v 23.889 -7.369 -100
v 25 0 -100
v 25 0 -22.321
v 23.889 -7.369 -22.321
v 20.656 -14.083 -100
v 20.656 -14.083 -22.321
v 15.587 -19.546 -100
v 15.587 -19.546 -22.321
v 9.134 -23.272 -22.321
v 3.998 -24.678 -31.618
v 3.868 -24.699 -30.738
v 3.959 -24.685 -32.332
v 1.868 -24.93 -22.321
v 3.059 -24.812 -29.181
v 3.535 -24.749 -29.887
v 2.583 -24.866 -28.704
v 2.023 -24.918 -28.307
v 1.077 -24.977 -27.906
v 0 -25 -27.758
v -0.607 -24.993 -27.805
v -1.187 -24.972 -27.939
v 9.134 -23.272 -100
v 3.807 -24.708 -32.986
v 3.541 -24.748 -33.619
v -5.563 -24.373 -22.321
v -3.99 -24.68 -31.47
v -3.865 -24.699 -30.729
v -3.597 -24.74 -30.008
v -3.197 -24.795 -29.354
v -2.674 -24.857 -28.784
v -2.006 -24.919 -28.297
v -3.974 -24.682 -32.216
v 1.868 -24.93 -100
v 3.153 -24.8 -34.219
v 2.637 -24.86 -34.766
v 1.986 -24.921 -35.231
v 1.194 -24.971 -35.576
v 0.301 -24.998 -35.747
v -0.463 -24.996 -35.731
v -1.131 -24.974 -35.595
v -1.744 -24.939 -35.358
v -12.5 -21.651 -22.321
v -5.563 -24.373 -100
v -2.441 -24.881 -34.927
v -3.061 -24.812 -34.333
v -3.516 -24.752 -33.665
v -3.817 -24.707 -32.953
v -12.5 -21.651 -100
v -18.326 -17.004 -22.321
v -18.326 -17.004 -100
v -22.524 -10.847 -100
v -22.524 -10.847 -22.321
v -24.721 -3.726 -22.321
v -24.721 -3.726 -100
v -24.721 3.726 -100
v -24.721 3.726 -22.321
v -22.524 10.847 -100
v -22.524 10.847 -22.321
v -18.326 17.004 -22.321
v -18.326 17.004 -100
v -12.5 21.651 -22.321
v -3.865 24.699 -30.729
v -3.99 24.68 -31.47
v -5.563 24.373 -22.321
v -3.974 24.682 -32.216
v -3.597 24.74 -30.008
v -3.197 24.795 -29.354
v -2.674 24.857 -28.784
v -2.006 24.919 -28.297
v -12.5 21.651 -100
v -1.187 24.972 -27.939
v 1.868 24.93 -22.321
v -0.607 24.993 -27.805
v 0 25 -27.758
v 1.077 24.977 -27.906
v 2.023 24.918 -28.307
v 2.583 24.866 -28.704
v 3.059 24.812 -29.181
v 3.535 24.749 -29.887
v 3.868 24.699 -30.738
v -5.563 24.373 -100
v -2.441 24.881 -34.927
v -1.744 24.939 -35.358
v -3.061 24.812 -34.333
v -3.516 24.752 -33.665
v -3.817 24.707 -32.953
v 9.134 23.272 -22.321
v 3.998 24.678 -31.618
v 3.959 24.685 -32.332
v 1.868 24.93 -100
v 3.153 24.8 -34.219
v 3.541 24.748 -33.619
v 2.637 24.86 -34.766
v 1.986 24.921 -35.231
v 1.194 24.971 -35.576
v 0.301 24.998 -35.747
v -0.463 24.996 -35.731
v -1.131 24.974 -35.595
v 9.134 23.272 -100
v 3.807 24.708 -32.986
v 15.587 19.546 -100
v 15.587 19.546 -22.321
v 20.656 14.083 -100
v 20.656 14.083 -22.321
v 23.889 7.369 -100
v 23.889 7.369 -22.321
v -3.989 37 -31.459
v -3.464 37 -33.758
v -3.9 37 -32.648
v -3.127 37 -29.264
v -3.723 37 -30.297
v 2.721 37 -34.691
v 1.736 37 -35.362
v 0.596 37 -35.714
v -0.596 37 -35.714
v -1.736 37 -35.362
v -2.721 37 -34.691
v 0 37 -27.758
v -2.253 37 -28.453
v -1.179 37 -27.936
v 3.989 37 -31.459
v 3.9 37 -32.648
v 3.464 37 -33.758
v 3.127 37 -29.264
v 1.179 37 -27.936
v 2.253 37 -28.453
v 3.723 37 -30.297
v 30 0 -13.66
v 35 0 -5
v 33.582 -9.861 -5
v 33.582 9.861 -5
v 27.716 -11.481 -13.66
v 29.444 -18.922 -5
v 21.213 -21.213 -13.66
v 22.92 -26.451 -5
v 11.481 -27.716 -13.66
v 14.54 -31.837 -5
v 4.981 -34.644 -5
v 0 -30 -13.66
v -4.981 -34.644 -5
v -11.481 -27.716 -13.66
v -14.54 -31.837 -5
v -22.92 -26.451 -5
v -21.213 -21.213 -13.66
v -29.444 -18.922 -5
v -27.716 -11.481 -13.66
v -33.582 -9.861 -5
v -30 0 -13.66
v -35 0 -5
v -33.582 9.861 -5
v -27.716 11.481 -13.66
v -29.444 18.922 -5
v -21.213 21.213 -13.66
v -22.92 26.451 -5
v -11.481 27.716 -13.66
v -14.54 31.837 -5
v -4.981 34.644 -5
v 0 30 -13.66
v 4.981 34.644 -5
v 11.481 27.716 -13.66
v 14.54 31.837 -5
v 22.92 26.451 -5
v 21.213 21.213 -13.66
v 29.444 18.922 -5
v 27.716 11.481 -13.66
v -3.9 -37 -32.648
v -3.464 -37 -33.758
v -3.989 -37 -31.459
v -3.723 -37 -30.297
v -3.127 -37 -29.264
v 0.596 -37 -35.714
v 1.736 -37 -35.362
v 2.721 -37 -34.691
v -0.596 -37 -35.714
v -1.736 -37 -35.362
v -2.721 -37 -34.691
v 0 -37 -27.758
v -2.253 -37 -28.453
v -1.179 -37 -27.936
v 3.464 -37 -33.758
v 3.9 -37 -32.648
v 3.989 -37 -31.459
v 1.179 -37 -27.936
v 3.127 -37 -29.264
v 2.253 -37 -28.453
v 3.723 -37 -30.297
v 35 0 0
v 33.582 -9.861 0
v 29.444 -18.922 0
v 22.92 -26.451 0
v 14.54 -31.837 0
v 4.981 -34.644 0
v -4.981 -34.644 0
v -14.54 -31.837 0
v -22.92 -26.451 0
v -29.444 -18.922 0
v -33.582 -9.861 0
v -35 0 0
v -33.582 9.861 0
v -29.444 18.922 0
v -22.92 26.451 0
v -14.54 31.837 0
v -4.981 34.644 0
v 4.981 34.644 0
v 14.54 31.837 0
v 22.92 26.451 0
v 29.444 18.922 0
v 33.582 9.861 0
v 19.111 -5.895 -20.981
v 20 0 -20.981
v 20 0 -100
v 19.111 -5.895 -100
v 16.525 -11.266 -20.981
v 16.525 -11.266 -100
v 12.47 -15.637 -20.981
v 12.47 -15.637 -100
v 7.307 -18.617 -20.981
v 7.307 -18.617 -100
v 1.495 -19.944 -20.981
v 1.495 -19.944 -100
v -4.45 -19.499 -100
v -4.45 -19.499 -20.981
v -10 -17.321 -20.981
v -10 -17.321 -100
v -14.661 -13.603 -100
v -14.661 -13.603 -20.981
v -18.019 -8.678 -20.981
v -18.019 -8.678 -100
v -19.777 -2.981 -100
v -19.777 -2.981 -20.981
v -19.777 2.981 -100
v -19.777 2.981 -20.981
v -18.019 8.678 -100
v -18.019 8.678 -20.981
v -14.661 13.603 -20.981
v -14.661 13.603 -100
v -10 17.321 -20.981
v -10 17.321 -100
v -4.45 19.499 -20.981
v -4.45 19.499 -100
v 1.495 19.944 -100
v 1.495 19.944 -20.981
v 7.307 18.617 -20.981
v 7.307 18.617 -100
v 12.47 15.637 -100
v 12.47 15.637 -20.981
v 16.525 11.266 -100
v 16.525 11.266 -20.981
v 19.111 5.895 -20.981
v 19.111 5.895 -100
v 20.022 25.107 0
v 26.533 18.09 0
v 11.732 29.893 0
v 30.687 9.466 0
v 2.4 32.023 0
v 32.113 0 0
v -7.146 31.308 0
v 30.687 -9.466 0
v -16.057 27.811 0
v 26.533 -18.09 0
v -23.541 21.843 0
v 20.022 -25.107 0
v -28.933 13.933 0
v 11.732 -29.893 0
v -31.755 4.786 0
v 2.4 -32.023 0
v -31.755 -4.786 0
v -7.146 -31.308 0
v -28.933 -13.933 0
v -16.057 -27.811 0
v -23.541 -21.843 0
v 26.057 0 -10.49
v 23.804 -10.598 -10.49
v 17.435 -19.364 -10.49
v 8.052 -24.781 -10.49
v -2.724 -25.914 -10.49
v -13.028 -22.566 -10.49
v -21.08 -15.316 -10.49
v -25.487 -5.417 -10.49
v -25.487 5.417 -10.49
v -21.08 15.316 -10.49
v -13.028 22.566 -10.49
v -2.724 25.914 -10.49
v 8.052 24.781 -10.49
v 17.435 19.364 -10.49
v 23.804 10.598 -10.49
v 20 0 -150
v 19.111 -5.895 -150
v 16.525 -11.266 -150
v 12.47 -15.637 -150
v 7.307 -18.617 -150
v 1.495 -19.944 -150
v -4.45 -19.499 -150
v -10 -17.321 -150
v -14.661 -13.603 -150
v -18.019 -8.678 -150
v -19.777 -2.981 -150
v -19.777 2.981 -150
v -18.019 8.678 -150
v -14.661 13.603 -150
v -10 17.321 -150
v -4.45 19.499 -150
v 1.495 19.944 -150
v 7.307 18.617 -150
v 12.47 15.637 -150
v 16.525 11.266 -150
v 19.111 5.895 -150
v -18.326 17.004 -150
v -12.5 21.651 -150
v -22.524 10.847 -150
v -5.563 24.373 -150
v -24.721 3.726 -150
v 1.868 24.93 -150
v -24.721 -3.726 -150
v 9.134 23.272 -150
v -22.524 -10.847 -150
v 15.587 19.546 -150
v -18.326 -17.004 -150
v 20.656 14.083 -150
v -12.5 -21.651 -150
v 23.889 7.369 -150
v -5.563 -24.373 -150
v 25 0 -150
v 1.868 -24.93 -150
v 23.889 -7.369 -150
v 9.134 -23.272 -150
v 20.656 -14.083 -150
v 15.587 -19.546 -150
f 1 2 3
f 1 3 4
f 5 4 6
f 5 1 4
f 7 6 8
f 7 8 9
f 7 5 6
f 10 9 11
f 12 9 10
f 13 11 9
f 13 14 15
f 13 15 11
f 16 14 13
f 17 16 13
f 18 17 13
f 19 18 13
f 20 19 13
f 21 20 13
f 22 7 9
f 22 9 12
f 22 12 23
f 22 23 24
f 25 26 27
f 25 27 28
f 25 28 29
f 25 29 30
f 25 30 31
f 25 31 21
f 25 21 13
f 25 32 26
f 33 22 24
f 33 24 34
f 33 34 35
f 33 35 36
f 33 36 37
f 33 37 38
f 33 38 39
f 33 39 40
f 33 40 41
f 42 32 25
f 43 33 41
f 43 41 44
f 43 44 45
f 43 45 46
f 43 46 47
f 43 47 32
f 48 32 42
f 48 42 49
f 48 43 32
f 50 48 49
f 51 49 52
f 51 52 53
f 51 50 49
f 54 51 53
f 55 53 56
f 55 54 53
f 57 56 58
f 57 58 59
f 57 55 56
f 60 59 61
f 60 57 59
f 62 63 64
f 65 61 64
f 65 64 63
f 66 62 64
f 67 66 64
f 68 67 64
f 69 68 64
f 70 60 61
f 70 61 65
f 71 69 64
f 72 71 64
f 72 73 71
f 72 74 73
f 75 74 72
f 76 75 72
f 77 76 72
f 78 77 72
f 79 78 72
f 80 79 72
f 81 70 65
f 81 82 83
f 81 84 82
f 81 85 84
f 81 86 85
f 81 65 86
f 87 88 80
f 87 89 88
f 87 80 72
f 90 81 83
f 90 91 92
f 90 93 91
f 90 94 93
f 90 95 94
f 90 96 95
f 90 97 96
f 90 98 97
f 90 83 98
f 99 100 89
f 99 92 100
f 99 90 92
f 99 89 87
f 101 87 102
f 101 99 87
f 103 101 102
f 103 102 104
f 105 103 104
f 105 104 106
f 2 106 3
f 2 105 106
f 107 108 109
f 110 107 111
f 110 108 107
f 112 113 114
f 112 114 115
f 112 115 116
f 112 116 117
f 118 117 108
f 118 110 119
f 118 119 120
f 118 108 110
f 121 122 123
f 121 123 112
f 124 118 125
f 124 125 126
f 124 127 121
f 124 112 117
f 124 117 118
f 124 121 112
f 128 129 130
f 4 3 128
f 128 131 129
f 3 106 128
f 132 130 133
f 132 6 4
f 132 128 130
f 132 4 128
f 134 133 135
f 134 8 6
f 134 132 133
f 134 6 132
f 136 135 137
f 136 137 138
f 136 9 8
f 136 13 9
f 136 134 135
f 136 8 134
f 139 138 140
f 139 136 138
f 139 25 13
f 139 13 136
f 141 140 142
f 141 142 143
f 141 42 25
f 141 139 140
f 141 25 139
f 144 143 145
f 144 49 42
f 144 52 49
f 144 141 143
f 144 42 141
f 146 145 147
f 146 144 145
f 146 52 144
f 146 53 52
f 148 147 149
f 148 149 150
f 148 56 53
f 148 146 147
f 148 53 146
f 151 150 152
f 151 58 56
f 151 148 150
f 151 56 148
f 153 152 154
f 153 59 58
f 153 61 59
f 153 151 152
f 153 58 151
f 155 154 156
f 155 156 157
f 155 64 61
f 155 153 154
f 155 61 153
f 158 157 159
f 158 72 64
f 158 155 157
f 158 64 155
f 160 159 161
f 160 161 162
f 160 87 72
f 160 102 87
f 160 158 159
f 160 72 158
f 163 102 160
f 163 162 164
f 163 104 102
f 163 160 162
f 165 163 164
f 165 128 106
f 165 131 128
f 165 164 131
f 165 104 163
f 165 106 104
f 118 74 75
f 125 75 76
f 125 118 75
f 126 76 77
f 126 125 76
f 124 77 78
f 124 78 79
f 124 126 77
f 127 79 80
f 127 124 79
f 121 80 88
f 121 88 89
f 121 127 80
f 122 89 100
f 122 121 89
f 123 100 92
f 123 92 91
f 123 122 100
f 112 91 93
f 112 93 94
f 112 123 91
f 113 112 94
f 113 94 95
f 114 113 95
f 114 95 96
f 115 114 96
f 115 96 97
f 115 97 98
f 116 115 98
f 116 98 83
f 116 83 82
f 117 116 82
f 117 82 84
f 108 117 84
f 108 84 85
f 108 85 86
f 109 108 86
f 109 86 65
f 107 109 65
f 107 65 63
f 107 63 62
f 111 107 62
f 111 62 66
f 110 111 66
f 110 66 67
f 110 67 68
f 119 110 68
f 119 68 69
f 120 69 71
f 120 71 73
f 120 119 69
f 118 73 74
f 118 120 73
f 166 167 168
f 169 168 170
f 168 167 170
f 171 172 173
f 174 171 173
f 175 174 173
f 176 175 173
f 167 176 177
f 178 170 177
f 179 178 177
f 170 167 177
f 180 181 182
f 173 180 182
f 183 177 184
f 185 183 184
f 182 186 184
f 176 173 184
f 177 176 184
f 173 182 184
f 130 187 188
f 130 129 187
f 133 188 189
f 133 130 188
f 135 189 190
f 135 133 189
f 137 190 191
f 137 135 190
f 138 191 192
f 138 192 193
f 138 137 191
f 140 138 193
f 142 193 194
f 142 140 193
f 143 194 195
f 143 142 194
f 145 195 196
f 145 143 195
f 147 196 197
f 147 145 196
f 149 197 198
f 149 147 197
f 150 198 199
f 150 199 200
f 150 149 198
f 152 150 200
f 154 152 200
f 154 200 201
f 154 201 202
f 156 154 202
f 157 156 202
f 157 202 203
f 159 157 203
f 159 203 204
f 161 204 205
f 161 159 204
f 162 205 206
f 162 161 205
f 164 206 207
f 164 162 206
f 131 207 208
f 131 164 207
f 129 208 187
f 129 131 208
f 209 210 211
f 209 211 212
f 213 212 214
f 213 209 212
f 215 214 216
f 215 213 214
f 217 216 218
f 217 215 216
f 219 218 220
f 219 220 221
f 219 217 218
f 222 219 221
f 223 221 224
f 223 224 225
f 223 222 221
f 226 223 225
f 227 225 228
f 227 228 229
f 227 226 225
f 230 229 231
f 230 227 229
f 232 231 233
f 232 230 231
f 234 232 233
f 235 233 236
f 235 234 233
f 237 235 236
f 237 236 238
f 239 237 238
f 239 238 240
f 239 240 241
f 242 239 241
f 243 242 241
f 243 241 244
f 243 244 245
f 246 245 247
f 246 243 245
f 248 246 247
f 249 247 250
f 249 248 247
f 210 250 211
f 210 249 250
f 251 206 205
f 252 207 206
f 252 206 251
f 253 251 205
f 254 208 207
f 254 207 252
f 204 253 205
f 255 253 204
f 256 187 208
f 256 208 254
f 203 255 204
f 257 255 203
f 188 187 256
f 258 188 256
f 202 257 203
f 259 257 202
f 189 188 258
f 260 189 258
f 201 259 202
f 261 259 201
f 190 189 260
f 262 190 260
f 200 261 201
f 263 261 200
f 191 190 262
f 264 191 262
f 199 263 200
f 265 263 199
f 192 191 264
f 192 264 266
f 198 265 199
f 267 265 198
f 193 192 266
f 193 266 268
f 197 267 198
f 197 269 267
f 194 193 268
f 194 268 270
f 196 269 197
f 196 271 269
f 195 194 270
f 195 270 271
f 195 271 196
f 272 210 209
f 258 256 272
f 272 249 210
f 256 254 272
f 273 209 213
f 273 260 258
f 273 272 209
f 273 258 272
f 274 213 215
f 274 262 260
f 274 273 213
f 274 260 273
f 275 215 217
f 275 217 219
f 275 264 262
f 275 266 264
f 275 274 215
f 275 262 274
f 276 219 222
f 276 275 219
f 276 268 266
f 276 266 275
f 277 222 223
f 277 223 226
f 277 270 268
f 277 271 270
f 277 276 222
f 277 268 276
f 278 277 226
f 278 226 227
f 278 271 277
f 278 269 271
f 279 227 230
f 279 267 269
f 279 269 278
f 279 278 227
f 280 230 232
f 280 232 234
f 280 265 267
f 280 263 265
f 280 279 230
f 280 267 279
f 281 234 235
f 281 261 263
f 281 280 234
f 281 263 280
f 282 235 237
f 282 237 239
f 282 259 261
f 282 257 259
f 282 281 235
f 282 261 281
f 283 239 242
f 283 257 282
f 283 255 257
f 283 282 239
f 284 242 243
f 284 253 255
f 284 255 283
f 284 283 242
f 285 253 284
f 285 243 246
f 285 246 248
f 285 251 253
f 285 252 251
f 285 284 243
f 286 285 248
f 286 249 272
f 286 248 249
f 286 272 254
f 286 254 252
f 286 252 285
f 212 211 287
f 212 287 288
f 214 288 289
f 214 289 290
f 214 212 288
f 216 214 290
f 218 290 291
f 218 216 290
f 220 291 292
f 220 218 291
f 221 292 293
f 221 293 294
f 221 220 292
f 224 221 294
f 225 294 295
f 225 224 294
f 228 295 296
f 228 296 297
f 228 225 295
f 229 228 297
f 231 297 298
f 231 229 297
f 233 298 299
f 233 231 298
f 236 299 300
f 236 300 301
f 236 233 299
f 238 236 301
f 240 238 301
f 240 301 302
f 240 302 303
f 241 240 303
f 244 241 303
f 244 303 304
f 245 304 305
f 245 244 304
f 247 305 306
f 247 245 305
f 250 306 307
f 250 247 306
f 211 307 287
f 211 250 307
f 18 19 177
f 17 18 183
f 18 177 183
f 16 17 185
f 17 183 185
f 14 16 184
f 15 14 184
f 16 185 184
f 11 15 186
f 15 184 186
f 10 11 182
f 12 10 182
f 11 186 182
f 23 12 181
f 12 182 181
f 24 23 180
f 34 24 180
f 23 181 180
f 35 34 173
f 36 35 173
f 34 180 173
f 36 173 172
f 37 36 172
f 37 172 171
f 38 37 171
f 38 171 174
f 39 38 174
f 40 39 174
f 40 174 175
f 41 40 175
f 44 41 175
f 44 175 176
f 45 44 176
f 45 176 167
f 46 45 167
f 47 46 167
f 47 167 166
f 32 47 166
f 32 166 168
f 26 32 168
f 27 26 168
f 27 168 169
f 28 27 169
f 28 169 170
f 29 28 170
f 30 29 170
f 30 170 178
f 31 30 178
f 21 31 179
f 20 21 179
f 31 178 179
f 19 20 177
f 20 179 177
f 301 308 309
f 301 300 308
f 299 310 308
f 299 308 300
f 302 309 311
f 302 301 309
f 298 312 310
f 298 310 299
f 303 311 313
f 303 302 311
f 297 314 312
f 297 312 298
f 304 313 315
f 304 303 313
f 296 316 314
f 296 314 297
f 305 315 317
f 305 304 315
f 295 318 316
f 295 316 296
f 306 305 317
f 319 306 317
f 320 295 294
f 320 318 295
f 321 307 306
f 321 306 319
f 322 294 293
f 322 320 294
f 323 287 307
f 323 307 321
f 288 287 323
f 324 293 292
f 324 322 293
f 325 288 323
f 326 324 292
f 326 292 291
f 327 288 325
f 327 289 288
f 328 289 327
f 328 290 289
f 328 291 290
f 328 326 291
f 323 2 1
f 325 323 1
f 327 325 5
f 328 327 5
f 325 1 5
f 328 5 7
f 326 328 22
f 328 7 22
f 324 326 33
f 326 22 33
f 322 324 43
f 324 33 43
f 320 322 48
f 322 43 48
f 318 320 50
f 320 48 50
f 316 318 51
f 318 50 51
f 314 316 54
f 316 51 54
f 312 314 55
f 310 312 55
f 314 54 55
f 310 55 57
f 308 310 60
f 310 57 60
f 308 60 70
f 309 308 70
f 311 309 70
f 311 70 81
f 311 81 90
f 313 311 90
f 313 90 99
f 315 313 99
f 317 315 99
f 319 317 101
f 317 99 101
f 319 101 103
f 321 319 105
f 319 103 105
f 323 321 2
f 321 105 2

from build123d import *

# Parameters (mm, degrees)
BOSS_EXTRUDE1_REACH      = 130.098
BOSS_EXTRUDE1_END_RADIUS = 25
SKETCH2_R                = 4
SKETCH3_R                = 25
SKETCH3_R_2              = 20
BOSS_EXTRUDE2_DEPTH      = 50


with BuildPart() as part:
    # Sketch1 → Revolve1 (revolve)
    with BuildSketch(Plane(origin=(0, 0, 0), x_dir=(0, 0, -1), z_dir=(1, 0, 0)), mode=Mode.PRIVATE) as revolve1_sk:
        Polygon((22.320508076, 25), (100, 25), (100, 20), (20.980762114, 20), (0, 32.113248654), (0, 35), (5, 35), align=None)
    revolve(revolve1_sk.sketch.rotate(Axis((0, 0, 0), (0, 0, -1)), 90), axis=Axis((0, 0, 0), (0, 0, -1)))

    # Boss-Extrude1: up to this cylinder (the profile starts outside it)
    boss_extrude1_end = Plane(origin=(0, 0, -31.75833), z_dir=(0, 0, 1)) * Cylinder(BOSS_EXTRUDE1_END_RADIUS, 311.196, mode=Mode.PRIVATE)
    # Sketch2 → Boss-Extrude1 (add, up to the surface)
    with BuildSketch(Plane(origin=(0, 37, 0), x_dir=(1, 0, 0), z_dir=(0, 1, 0)), mode=Mode.PRIVATE) as boss_extrude1_sk1:
        with Locations(Location((0, 31.758330249, 0), (0, 0, 270))):
            Circle(SKETCH2_R)
    boss_extrude1_tool1 = extrude(boss_extrude1_sk1.sketch, amount=-BOSS_EXTRUDE1_REACH, mode=Mode.PRIVATE) - boss_extrude1_end
    boss_extrude1 = boss_extrude1_tool1.solids().sort_by_distance((0, 37, -31.75833))[0]
    add(boss_extrude1)

    # Mirror1: Boss-Extrude1 across plane
    add(boss_extrude1.mirror(Plane.ZX))

    # Sketch3 → Boss-Extrude2 (add)
    with BuildSketch(Plane(origin=(0, 0, -100), x_dir=(-1, 0, 0), z_dir=(0, 0, -1))):
        with Locations(Location((0, 0, 0), (0, 0, 180))):
            Circle(SKETCH3_R)
        with Locations(Location((0, 0, 0), (0, 0, 180))):
            Circle(SKETCH3_R_2, mode=Mode.SUBTRACT)
    extrude(amount=BOSS_EXTRUDE2_DEPTH)


solid = part.part
